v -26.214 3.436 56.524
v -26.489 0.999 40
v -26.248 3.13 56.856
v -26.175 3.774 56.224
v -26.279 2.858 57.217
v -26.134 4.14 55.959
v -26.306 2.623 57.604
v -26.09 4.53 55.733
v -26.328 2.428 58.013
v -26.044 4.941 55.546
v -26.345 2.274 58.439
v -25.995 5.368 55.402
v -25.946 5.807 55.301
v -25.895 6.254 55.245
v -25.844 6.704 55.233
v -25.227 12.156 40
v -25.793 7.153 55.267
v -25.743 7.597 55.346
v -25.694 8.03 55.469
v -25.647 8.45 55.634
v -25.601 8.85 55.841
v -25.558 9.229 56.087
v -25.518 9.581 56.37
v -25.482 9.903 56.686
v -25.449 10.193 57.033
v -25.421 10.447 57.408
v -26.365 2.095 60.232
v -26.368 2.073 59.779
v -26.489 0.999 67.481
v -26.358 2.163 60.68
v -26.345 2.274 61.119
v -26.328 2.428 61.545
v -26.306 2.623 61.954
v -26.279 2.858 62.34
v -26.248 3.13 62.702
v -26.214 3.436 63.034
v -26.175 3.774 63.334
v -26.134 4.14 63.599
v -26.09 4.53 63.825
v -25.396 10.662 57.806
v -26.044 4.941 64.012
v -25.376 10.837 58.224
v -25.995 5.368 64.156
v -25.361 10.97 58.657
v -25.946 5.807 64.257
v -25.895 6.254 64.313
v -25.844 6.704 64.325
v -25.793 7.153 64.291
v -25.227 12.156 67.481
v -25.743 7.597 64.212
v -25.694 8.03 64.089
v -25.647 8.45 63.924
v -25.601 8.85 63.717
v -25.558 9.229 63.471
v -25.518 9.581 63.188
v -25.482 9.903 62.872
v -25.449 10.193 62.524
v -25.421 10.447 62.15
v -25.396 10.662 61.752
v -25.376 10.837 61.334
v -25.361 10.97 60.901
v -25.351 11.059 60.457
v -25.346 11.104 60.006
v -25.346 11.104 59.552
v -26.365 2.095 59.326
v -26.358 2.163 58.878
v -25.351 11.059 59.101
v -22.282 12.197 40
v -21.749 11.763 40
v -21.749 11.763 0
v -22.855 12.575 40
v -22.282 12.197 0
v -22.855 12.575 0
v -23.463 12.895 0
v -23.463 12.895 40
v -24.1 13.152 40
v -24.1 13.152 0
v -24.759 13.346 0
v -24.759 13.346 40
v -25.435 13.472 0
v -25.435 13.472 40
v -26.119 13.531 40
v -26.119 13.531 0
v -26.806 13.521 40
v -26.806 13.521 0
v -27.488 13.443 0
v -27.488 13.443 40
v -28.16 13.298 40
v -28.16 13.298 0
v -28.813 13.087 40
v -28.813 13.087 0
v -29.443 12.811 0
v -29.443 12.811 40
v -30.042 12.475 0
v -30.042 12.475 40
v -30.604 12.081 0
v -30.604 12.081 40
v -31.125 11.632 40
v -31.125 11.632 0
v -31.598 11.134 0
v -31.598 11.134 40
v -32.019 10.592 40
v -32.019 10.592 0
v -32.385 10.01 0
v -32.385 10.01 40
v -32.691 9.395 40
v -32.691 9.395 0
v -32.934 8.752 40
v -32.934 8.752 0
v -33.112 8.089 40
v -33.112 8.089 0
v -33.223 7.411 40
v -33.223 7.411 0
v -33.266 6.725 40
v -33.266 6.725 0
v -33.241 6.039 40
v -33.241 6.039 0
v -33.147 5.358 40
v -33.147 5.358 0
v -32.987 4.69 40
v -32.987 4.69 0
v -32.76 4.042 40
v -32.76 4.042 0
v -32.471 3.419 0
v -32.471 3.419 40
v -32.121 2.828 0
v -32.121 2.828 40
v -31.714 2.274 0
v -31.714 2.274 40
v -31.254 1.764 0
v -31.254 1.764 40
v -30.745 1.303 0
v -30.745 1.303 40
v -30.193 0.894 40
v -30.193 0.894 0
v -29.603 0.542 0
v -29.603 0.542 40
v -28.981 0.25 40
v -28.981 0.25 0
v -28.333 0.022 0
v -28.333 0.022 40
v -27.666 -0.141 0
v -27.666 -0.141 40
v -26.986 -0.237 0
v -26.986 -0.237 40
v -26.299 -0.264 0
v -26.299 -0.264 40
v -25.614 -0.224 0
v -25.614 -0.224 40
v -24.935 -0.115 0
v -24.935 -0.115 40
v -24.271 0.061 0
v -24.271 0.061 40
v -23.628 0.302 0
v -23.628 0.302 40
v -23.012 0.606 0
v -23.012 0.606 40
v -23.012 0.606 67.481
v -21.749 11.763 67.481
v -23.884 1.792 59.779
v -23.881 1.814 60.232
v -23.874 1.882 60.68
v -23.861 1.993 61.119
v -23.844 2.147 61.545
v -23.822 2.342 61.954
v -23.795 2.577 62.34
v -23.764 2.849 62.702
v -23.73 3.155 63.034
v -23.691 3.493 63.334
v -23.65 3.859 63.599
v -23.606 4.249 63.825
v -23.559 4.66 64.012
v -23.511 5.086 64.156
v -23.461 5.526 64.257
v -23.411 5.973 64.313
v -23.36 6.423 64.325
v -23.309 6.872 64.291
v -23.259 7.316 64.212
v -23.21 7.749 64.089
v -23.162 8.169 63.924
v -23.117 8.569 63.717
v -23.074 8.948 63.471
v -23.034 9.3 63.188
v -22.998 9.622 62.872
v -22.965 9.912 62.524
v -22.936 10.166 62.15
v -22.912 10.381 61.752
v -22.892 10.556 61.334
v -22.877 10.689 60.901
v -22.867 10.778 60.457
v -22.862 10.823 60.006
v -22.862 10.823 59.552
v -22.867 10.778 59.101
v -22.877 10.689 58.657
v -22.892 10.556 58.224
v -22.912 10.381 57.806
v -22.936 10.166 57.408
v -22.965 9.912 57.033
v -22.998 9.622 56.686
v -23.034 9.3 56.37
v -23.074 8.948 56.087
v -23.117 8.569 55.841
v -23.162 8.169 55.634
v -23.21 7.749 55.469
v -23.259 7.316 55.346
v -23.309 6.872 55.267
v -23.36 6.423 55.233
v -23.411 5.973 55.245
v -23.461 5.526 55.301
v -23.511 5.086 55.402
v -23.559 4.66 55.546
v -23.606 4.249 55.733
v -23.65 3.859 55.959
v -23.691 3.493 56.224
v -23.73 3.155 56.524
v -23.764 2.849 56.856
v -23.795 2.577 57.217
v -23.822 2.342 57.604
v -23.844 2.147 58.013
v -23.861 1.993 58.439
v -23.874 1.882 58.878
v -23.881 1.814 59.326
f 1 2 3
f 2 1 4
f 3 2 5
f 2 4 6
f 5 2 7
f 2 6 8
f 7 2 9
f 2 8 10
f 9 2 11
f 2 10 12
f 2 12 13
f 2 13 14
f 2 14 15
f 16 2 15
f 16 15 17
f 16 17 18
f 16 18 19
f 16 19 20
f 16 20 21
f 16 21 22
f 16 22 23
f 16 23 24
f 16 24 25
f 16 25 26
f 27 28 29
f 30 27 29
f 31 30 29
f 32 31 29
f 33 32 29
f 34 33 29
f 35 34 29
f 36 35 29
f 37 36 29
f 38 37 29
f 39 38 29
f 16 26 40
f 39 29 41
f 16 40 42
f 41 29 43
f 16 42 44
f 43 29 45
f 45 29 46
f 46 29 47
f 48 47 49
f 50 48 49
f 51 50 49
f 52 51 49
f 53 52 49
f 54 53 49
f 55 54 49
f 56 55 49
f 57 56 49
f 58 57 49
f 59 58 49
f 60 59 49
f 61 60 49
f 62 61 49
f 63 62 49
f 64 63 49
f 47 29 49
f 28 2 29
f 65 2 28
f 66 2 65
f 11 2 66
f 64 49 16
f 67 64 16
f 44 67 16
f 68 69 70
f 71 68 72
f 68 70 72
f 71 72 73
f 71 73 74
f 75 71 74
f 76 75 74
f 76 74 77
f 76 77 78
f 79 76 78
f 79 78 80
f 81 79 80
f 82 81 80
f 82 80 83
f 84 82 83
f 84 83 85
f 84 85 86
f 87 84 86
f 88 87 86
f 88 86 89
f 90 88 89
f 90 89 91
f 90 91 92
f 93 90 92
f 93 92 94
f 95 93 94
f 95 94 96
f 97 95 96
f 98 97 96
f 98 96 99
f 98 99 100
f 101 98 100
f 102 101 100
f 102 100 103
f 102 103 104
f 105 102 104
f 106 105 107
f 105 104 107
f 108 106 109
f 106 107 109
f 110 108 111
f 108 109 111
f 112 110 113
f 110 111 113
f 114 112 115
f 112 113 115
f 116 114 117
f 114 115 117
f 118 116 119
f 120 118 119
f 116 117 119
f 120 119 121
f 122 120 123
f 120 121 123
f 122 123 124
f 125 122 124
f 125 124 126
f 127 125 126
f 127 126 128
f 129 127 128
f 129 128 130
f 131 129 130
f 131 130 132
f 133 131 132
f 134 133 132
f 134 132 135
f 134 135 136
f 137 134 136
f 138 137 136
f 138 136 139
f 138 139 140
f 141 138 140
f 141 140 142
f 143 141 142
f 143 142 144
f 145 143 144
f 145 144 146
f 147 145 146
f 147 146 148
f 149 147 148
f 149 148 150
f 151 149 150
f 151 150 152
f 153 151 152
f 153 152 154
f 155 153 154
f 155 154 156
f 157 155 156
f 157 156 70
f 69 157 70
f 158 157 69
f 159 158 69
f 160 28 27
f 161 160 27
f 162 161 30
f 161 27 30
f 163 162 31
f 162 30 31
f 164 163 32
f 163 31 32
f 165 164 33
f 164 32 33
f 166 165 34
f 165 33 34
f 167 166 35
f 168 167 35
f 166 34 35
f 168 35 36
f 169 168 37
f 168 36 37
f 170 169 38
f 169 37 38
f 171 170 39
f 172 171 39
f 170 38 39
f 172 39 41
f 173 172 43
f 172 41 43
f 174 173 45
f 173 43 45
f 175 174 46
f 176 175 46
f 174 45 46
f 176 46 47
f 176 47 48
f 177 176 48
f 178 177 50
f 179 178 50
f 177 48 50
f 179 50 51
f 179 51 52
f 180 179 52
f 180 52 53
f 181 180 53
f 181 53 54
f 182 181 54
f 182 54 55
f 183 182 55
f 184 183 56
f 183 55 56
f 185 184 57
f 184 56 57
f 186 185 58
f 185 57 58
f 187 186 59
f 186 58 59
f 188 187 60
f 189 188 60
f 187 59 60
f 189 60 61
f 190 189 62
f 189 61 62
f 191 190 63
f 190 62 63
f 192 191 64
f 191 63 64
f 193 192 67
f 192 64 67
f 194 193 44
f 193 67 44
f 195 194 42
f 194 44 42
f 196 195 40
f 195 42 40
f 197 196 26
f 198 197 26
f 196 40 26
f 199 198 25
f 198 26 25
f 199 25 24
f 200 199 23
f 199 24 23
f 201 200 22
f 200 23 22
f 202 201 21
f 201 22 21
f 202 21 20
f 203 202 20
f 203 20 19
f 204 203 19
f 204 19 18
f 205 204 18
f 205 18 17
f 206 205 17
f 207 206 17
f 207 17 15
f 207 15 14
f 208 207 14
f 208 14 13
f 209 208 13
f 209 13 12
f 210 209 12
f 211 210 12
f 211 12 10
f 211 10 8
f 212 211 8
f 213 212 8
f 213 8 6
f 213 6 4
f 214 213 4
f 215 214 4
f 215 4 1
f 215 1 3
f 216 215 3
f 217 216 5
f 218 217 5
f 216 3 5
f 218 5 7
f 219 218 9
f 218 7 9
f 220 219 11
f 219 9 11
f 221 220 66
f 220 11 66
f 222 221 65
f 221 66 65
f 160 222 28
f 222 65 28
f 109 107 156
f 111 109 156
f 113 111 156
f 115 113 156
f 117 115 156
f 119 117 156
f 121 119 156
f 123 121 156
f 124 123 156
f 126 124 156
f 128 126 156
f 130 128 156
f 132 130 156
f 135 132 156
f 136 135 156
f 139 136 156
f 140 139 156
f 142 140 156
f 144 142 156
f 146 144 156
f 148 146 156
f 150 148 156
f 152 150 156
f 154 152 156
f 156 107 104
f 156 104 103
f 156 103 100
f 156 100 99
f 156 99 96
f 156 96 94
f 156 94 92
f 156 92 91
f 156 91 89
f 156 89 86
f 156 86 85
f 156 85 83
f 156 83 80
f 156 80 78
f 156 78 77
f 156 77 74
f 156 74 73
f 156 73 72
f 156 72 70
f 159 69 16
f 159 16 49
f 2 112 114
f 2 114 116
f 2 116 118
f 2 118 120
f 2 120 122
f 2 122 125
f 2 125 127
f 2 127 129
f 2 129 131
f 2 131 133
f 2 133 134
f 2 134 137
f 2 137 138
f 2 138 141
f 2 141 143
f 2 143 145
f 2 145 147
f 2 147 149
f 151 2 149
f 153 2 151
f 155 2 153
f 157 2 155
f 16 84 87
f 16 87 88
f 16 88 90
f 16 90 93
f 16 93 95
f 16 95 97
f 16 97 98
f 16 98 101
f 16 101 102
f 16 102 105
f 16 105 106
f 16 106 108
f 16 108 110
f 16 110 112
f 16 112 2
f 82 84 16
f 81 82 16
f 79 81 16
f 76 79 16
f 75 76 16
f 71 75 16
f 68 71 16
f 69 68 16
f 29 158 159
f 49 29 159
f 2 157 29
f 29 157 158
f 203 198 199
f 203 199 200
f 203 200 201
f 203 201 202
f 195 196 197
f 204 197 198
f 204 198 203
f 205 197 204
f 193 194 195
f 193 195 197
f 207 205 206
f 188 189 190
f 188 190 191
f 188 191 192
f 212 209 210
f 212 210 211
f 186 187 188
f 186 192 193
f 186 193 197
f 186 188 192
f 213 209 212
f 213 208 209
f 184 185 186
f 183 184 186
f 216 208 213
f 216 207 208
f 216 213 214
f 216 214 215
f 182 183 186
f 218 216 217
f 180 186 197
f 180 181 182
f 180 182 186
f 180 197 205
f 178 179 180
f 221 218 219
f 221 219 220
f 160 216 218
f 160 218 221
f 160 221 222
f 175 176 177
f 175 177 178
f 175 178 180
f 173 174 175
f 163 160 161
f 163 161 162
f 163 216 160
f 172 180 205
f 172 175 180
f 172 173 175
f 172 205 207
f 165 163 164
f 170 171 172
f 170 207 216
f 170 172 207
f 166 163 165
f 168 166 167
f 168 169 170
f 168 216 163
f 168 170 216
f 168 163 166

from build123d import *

# Parameters (mm, degrees)
F0_R     = 6.9
F1_DEPTH = 40
F3_DEPTH = 40
F4_W     = 11.228349
F4_H     = 10.522324
F5_DEPTH = 3.5
F6_W     = 11.228349
F6_H     = 16.9586
F7_DEPTH = 3.5
F8_R     = 4.547119
F9_DEPTH = 2.5


with BuildPart() as f1:
    # F0 (on Top) → F1 (new body)
    with BuildSketch(Plane.XY):
        with Locations((-26.366409, 6.635255)):
            Circle(F0_R)
    extrude(amount=F1_DEPTH)

    # F2 (on face) → F3 (cut)
    with BuildSketch(Plane(origin=(0, 0, 0), x_dir=(1, 0, 0), z_dir=(0, 0, -1))):
        Polygon((-17.36803, 0.397698), (-23.011649, -0.605696), (-21.749303, -11.76286), (-16.136123, -11.266587), align=None)
    extrude(amount=-F3_DEPTH, mode=Mode.SUBTRACT)

    # F4 (on face) → F5 (join)
    with BuildSketch(Plane(origin=(-22.78846, 2.578335, 0), x_dir=(0.112425, 0.99366, 0), z_dir=(0.99366, -0.112425, 0))):
        with Locations((3.62895, 45.261162)):
            Rectangle(F4_W, F4_H)
    extrude(amount=-F5_DEPTH)

    # F6 (on face) → F7 (join)
    with BuildSketch(Plane(origin=(-22.78846, 2.578335, 0), x_dir=(0.112425, 0.99366, 0), z_dir=(0.99366, -0.112425, 0))):
        with Locations((3.62895, 59.001624)):
            Rectangle(F6_W, F6_H)
    extrude(amount=-F7_DEPTH)

    # F8 (on face) → F9 (cut)
    with BuildSketch(Plane(origin=(-26.266271, 2.971822, 0), x_dir=(-0.112425, -0.99366, 0), z_dir=(-0.99366, 0.112425, 0))):
        with Locations((-3.642559, 59.778914)):
            Circle(F8_R)
    extrude(amount=-F9_DEPTH, mode=Mode.SUBTRACT)


solid = f1.part
